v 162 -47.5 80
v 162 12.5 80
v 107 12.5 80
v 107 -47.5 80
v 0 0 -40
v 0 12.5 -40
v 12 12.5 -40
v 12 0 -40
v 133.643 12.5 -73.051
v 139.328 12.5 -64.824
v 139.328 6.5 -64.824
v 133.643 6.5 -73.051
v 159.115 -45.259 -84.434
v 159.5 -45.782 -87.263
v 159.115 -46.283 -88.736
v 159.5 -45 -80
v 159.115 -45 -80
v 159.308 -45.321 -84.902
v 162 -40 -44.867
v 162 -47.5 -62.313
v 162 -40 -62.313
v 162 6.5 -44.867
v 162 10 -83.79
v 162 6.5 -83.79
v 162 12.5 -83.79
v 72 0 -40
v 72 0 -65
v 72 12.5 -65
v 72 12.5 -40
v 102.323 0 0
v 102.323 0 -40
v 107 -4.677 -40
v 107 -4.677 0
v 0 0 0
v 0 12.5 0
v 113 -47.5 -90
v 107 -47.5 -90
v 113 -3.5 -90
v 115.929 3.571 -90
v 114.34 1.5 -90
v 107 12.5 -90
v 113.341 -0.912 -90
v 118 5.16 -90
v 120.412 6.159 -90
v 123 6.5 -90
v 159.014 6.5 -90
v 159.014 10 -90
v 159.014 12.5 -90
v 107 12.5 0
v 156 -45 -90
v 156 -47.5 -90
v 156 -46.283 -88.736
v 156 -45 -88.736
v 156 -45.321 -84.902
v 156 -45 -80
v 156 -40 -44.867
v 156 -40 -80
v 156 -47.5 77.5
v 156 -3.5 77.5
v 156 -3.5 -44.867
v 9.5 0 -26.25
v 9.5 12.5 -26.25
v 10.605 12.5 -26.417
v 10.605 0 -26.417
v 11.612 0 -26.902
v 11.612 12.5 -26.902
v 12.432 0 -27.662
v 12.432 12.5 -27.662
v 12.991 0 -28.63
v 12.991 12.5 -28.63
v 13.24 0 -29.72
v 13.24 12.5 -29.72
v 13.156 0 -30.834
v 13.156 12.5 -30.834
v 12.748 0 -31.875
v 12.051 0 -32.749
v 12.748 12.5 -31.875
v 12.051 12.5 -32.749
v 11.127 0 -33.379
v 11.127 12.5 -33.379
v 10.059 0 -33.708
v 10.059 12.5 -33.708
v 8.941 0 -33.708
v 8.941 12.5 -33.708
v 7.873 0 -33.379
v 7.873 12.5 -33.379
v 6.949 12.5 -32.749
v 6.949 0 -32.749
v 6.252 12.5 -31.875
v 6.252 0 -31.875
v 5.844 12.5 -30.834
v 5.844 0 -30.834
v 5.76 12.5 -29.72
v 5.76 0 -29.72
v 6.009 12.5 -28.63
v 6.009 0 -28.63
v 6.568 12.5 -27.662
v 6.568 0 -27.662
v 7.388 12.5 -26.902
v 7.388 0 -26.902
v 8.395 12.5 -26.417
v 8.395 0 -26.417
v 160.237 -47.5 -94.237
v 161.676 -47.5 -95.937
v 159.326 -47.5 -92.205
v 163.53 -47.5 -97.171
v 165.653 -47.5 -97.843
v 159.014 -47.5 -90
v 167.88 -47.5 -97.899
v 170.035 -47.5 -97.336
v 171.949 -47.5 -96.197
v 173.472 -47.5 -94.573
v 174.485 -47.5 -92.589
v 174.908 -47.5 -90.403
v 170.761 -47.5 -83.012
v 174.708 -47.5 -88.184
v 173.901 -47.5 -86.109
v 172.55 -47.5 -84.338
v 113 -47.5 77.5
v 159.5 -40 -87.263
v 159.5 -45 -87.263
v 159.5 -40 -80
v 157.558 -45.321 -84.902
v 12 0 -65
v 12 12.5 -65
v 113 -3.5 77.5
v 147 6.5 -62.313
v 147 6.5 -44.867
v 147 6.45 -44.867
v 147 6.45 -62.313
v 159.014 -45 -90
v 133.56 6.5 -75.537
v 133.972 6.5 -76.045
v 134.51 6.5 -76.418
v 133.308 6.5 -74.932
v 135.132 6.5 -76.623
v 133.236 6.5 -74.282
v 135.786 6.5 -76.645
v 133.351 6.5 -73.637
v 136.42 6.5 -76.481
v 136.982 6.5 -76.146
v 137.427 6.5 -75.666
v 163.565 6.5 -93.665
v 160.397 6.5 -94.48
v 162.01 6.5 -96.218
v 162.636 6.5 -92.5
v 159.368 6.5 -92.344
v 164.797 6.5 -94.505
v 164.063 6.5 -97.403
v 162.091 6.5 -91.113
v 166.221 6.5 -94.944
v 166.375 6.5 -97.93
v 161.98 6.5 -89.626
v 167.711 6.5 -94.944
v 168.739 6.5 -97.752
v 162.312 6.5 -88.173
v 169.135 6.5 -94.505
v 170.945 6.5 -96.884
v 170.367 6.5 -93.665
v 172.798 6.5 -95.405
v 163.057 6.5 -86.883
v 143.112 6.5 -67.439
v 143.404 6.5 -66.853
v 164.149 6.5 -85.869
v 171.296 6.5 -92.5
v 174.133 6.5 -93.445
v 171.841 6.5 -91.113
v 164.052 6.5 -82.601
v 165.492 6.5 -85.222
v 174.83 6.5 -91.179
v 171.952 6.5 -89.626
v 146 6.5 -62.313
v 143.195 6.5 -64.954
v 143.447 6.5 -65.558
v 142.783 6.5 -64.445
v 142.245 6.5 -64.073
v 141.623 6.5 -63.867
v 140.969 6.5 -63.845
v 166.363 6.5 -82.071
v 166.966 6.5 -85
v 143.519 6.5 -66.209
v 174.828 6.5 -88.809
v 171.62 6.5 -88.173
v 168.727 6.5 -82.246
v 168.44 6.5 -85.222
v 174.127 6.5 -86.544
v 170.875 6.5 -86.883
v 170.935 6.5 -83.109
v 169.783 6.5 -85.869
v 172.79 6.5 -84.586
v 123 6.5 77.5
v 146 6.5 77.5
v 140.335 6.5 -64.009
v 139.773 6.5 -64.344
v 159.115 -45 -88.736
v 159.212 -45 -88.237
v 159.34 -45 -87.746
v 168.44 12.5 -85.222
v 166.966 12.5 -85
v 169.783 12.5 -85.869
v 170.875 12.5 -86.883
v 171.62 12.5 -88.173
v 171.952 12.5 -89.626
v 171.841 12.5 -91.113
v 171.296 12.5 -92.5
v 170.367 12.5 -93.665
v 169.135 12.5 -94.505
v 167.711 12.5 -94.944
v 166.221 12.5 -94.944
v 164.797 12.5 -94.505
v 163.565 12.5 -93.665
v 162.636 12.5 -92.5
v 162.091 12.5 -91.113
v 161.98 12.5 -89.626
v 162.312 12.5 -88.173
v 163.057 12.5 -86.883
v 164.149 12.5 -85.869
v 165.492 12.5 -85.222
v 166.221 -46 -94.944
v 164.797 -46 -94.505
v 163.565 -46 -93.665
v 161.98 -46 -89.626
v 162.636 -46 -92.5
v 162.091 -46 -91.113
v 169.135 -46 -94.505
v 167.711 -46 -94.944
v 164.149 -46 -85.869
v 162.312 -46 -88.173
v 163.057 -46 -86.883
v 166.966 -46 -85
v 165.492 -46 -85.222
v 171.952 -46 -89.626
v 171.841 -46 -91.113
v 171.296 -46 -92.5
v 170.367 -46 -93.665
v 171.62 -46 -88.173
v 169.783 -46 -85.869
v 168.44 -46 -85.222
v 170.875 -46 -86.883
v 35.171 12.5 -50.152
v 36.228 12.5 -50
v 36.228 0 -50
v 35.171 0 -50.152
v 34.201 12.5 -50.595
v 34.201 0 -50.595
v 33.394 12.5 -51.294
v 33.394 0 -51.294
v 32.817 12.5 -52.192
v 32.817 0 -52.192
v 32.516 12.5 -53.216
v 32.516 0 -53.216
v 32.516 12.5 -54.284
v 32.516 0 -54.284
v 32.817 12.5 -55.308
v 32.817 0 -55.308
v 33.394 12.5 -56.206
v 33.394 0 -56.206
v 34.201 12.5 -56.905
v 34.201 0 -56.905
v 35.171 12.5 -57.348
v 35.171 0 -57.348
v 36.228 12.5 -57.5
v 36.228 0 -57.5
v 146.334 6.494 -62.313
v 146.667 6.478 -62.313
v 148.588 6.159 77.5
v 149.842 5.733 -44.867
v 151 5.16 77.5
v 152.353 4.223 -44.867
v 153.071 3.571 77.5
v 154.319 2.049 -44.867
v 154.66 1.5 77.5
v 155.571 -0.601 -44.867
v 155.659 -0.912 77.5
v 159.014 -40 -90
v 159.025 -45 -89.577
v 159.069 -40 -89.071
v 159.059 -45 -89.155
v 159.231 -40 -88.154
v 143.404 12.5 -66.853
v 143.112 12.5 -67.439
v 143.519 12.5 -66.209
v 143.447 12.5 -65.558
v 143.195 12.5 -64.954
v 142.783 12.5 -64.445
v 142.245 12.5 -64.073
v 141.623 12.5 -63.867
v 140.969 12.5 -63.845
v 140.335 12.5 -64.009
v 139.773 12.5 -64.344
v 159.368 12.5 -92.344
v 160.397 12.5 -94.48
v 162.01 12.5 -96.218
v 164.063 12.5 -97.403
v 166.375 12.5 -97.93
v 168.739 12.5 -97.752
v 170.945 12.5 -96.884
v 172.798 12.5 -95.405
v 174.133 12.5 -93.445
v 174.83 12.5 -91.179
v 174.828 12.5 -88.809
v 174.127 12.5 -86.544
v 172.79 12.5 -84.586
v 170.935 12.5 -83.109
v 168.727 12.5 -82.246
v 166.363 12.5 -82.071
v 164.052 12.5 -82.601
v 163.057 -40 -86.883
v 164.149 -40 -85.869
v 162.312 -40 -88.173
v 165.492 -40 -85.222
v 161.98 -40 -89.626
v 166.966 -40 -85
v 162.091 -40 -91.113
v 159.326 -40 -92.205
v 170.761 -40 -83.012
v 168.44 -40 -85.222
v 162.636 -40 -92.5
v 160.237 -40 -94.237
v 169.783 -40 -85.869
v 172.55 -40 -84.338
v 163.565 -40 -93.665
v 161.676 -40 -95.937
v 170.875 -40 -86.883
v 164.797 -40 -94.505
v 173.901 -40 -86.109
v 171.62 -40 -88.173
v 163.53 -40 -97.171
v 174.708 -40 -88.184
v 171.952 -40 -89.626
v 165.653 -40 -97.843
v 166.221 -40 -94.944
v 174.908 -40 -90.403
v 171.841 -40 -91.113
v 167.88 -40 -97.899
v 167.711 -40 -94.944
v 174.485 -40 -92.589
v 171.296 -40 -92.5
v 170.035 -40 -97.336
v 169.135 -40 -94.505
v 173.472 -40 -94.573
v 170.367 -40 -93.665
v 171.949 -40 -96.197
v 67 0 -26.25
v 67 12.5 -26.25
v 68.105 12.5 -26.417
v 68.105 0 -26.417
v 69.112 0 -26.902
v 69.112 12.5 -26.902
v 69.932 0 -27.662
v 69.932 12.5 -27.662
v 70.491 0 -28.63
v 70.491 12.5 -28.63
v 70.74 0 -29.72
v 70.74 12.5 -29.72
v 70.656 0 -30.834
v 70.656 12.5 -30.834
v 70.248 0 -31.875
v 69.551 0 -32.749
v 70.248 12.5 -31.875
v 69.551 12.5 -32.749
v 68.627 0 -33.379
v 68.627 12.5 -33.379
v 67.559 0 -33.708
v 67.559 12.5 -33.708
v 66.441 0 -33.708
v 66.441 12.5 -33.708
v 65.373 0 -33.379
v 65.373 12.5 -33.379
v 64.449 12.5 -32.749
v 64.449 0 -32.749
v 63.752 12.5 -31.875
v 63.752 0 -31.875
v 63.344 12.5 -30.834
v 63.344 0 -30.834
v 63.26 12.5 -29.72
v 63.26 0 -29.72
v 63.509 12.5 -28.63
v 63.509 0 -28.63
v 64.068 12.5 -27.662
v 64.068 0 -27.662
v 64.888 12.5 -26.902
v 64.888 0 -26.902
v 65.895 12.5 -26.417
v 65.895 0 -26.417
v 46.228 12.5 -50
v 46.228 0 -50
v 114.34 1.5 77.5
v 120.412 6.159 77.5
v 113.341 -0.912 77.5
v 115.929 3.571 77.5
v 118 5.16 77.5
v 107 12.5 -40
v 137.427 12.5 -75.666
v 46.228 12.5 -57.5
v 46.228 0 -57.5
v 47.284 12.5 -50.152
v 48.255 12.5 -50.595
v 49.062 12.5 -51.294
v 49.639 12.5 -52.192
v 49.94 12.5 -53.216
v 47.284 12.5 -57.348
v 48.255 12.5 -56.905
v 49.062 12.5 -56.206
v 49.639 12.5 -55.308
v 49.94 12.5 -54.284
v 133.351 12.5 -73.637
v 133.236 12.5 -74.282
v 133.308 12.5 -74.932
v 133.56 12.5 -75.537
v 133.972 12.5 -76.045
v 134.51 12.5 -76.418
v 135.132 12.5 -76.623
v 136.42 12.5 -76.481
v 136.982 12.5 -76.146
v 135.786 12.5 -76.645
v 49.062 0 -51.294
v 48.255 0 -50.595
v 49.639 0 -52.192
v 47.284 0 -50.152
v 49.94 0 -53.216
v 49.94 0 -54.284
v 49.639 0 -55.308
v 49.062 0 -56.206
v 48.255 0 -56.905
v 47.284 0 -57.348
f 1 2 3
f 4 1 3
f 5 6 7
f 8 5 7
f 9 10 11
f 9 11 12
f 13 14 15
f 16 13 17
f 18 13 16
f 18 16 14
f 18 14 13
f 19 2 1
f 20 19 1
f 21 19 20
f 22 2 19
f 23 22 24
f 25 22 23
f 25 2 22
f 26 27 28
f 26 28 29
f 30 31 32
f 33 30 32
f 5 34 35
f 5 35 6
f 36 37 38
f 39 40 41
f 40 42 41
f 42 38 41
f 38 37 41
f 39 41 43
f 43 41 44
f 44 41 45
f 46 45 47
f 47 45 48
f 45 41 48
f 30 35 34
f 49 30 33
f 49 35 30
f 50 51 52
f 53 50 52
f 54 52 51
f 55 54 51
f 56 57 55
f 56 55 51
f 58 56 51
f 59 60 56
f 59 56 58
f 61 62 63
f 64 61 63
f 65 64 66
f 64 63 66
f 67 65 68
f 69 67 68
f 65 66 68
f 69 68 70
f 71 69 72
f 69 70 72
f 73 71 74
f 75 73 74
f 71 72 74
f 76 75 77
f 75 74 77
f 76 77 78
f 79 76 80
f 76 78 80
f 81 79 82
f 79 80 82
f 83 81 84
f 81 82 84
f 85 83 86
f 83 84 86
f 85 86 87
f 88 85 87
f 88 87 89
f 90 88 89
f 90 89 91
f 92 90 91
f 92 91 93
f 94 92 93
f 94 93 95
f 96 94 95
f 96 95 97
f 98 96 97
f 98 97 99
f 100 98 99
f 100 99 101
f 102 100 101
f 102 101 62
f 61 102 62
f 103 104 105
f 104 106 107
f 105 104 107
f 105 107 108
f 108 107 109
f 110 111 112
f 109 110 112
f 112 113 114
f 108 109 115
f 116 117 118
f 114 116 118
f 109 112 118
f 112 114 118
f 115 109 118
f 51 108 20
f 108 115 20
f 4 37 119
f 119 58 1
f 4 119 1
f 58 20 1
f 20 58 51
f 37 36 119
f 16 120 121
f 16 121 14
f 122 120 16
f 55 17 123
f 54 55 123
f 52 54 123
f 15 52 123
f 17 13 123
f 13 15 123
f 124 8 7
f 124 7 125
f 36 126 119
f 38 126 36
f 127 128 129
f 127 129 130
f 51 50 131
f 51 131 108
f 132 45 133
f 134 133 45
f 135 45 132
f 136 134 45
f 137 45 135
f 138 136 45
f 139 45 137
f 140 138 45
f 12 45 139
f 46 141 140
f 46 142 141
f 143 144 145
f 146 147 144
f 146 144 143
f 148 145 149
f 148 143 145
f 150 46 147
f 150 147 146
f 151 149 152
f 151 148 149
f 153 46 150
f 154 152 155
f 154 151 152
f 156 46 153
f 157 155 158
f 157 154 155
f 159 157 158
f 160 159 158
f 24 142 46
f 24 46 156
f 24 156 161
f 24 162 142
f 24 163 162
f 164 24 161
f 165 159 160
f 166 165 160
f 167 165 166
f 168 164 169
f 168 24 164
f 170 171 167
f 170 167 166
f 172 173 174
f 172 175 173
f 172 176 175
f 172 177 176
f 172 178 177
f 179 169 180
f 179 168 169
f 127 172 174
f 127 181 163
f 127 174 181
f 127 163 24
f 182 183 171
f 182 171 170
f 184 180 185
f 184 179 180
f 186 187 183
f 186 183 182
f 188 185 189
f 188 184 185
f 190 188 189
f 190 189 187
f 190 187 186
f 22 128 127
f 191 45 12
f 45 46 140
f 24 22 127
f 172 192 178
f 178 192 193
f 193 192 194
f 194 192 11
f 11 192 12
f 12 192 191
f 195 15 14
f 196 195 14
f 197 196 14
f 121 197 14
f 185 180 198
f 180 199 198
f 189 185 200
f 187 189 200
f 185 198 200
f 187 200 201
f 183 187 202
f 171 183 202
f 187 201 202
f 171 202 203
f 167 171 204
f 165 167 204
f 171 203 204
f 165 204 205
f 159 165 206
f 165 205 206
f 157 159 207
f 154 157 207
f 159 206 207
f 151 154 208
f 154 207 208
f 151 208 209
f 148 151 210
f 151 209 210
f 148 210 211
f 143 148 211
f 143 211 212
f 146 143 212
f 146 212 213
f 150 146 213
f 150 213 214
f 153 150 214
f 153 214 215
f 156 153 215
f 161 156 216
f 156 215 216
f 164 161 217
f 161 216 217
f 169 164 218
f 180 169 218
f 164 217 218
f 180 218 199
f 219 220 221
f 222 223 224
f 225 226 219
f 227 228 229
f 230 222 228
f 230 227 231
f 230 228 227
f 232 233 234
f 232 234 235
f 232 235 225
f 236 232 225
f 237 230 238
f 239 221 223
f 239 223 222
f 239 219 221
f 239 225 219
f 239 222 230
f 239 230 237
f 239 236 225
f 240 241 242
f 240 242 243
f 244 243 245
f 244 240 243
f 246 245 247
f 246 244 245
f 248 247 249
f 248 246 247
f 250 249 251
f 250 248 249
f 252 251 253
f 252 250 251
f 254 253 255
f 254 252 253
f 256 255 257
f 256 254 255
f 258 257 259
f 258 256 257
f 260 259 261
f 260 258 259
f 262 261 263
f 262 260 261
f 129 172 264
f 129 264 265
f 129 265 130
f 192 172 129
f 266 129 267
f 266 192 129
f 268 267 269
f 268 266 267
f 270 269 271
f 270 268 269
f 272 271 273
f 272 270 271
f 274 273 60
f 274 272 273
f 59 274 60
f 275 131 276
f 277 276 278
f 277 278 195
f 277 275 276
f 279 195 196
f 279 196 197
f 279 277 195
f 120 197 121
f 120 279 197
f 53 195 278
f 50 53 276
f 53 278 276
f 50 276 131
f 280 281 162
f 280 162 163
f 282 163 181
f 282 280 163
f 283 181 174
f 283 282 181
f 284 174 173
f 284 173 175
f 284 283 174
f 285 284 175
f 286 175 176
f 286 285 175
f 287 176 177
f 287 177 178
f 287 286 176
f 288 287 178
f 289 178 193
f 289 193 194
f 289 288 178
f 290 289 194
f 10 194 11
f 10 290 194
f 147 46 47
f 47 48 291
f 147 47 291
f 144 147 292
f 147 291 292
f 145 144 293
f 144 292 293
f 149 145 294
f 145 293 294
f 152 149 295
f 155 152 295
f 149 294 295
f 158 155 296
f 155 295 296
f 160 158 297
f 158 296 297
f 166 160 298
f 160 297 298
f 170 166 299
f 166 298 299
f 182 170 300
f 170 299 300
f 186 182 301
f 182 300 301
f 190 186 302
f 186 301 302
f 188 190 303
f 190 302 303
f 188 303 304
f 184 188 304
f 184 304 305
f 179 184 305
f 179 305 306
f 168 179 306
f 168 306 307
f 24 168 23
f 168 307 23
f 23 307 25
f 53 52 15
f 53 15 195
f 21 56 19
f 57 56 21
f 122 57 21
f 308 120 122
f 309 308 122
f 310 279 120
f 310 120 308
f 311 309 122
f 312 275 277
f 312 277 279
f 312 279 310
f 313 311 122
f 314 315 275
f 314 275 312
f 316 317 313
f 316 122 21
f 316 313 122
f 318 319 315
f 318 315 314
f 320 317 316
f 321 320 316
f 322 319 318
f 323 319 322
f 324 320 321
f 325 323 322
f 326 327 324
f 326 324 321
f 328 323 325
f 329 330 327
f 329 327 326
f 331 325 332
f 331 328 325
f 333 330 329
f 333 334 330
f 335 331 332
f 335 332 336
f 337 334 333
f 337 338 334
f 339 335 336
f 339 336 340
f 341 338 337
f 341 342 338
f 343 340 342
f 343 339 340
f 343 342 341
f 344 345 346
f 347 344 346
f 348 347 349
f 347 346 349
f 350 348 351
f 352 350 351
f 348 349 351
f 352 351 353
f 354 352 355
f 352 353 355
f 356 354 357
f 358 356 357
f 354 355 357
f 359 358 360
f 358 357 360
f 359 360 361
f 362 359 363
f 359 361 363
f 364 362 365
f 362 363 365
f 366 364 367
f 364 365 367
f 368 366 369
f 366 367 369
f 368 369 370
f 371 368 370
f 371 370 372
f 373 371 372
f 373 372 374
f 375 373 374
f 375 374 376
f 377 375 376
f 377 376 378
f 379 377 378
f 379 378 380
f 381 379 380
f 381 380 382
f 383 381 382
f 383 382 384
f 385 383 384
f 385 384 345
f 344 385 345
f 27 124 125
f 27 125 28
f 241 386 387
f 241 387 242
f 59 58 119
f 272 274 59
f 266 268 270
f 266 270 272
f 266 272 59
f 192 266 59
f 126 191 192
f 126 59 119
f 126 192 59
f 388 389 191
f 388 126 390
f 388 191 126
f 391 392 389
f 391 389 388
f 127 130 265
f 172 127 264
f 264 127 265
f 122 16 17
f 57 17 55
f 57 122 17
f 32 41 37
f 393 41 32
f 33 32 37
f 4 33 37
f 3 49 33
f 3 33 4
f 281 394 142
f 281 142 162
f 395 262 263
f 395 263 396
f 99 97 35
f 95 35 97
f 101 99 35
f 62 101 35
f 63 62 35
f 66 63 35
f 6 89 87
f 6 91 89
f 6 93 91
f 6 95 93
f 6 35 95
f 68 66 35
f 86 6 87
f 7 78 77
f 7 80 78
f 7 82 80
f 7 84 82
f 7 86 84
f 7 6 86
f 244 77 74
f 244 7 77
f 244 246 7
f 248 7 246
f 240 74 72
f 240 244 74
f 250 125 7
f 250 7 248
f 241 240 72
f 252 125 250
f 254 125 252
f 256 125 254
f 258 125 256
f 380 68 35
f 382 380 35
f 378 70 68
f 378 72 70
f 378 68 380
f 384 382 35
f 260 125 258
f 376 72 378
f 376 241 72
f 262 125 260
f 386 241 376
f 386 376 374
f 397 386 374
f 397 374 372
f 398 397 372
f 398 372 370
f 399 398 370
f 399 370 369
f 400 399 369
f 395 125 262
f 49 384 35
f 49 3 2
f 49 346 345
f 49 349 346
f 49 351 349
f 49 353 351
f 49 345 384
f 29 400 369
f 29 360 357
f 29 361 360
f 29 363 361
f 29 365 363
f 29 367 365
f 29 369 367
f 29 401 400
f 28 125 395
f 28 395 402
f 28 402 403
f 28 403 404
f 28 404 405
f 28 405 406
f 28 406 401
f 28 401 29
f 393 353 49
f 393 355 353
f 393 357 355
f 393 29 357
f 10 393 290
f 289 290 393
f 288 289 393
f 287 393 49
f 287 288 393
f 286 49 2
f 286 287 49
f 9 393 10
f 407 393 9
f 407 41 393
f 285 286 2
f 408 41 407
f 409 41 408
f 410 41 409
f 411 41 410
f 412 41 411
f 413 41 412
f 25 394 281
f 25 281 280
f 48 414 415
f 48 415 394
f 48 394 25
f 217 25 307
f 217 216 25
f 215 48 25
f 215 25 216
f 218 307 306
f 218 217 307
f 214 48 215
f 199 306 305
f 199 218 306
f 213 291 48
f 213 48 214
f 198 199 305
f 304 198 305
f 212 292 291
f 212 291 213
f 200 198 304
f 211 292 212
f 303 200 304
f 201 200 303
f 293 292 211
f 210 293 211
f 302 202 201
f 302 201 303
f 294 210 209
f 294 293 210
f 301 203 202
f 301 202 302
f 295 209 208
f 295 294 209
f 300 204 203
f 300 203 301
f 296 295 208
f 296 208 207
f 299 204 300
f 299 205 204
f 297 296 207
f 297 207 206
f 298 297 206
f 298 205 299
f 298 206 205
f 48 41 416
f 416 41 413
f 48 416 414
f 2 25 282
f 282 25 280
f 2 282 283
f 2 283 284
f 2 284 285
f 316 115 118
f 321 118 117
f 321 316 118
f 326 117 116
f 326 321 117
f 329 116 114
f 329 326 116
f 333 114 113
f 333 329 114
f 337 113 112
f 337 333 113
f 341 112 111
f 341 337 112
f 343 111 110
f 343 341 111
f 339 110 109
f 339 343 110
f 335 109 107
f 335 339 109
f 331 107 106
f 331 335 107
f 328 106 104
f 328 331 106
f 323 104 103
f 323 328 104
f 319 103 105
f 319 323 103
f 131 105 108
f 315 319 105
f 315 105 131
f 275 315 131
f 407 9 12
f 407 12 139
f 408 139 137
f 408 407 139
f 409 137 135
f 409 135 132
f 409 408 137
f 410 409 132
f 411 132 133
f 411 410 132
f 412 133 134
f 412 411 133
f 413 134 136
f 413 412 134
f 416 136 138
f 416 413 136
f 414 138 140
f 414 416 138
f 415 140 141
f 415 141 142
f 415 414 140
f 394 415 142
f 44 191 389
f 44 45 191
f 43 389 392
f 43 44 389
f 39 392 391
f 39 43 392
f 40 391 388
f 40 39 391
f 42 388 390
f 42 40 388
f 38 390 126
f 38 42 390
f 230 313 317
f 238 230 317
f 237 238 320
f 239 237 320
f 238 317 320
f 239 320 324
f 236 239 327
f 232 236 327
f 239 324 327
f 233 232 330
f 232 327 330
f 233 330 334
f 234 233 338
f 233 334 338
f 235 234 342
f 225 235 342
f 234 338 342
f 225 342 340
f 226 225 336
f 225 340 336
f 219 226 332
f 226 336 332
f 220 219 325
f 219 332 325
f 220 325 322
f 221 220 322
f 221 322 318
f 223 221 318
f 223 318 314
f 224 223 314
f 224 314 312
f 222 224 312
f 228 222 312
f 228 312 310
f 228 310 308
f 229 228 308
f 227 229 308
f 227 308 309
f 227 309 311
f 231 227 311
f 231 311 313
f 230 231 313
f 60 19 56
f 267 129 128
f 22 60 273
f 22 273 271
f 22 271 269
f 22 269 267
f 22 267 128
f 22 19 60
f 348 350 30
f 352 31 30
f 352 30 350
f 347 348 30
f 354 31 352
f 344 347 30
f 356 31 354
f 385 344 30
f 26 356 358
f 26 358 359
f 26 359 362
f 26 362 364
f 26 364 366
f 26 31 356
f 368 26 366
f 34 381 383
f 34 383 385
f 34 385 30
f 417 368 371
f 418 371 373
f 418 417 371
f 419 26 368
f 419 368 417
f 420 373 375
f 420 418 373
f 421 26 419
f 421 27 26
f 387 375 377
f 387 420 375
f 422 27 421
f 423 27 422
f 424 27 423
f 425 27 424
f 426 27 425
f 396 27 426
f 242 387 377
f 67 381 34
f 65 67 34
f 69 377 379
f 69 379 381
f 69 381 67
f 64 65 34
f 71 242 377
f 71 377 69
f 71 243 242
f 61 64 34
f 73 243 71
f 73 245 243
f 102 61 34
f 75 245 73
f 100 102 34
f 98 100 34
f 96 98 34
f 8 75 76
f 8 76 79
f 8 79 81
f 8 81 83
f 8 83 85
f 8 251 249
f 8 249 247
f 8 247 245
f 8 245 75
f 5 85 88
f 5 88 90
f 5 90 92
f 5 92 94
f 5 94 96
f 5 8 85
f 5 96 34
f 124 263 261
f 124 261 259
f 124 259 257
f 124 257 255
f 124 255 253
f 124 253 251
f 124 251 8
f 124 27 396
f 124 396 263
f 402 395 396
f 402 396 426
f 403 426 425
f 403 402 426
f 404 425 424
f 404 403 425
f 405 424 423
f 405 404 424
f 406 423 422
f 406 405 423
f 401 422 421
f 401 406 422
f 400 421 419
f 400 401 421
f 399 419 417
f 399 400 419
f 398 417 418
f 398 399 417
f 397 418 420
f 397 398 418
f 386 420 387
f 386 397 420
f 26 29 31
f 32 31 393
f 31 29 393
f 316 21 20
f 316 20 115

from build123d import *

# Parameters (mm, degrees)
BOSS_EXTRUDE1_DEPTH  = 12.5
BOSS_EXTRUDE2_DEPTH  = 60
SKETCH3_W            = 50
SKETCH3_H            = 55
CUT_EXTRUDE1_DEPTH   = 167.5
FILLET1_SIZE         = 2.5
FILLET1_SIZE_2       = 10
BOSS_EXTRUDE3_REACH  = 196.792
SKETCH6_R            = 7.951814216
CUT_EXTRUDE2_DEPTH   = 55
SKETCH9_W            = 5.049792513
SKETCH9_H            = 55
CUT_EXTRUDE3_DEPTH   = 2.5
SKETCH10_R           = 5
CUT_EXTRUDE4_DEPTH   = 58.5
SKETCH11_W           = 20
SKETCH11_H           = 55
CUT_EXTRUDE6_DEPTH   = 2.5
SKETCH12_W           = 49.615365164
SKETCH12_H           = 4.469133196
CUT_EXTRUDE7_DEPTH   = 167.5
BOSS_EXTRUDE4_START  = 5
SKETCH13_R           = 5
BOSS_EXTRUDE4_DEPTH  = 5
BOSS_EXTRUDE5_DEPTH  = 2.5
SKETCH17_W           = 167.5
SKETCH17_H           = 57.5
BOSS_EXTRUDE6_DEPTH  = 3.5
BOSS_EXTRUDE7_DEPTH  = 3.5
SKETCH20_W           = 139.813438208
SKETCH20_H           = 51.5
BOSS_EXTRUDE8_DEPTH  = 3.5
BOSS_EXTRUDE9_DEPTH  = 3.115365164
BOSS_EXTRUDE10_START = 4
BOSS_EXTRUDE10_DEPTH = 4
SKETCH24_R           = 3.75
CUT_EXTRUDE8_DEPTH   = 210.262529948
CUT_EXTRUDE9_DEPTH   = 210.262529948
SKETCH26_R           = 5
CUT_EXTRUDE10_DEPTH  = 3.5
BOSS_EXTRUDE11_DEPTH = 40
FILLET2_R            = 10
CUT_EXTRUDE11_DEPTH  = 6
SKETCH30_W           = 17.446895317
SKETCH30_H           = 47.5
CUT_EXTRUDE12_DEPTH  = 15
BOSS_EXTRUDE12_START = 1
BOSS_EXTRUDE12_DEPTH = 1


with BuildPart() as part:
    # Sketch1 → Boss-Extrude1 (new body)
    with BuildSketch(Plane(origin=(0, 0, 0), x_dir=(1, 0, 0), z_dir=(0, 1, 0))):
        Polygon((0, 0), (0, 40), (12, 40), (12, 65), (72, 65), (72, 40), (107, 40), (107, 0), align=None)
    extrude(amount=BOSS_EXTRUDE1_DEPTH)

    # Sketch2 → Boss-Extrude2 (add)
    with BuildSketch(Plane(origin=(0, 12.5, 0), x_dir=(1, 0, 0), z_dir=(0, 1, 0))):
        Polygon((107, 0), (107, 40), (107, 90), (162, 90), (162, -80), (107, -80), align=None)
    extrude(amount=-BOSS_EXTRUDE2_DEPTH)

    # Sketch3 → Cut-Extrude1 (cut)
    with BuildSketch(Plane(origin=(0, 0, -90), x_dir=(-1, 0, 0), z_dir=(0, 0, -1))):
        with Locations((-134.5, -17.5)):
            Rectangle(SKETCH3_W, SKETCH3_H)
    extrude(amount=-CUT_EXTRUDE1_DEPTH, mode=Mode.SUBTRACT)

    # Fillet1
    # an asymmetric fillet: 10, 2.5 mm, written as the material it takes off along each edge
    with BuildSketch(Plane(origin=(159.5, -45, -90), x_dir=(0, -1, 0), z_dir=(-1, 0, 0))) as fillet1_piece_1:
        with BuildLine():
            Bezier((FILLET1_SIZE, 0), (0, 0), (0, FILLET1_SIZE_2), weights=[1, 0.707106781, 1])
            Line((0, FILLET1_SIZE_2), (0, 0))
            Line((0, 0), (FILLET1_SIZE, 0))
        make_face()
    extrude(amount=50, mode=Mode.SUBTRACT)

    # Boss-Extrude3: up to this face of the body (flat: up to its plane)
    boss_extrude3_end = Plane(part.part.faces().sort_by_distance((134.5, -47.5, -5))[0])
    # Sketch6 → Boss-Extrude3 (add, up to the picked face)
    with BuildSketch(Plane(origin=(0, 12.5, 0), x_dir=(1, 0, 0), z_dir=(0, 1, 0)), mode=Mode.PRIVATE) as boss_extrude3_sk1:
        with Locations((166.966019237, 90)):
            Circle(SKETCH6_R)
    boss_extrude3_tool1 = split(extrude(boss_extrude3_sk1.sketch, amount=-BOSS_EXTRUDE3_REACH, mode=Mode.PRIVATE), bisect_by=boss_extrude3_end, keep=Keep.BOTH, mode=Mode.PRIVATE)
    add(boss_extrude3_tool1.solids().sort_by(Axis((166.966019, 12.5, -90), (0, -1, 0)))[0])

    # Sketch7 → Cut-Extrude2 (cut)
    with BuildSketch(Plane(origin=(0, 10, 0), x_dir=(1, 0, 0), z_dir=(0, 1, 0))):
        with BuildLine():
            ThreePointArc((162, 83.789524795), (174.132615768, 93.445467092), (159.01420502, 90))
            ThreePointArc((159.01420502, 90), (159.799422705, 86.554532908), (162, 83.789524795))
        make_face()
    extrude(amount=-CUT_EXTRUDE2_DEPTH, mode=Mode.SUBTRACT)

    # Sketch9 → Cut-Extrude3 (cut)
    with BuildSketch(Plane(origin=(162, 0, 0), x_dir=(0, 0, -1), z_dir=(1, 0, 0))):
        with Locations((84.738334464, -17.5)):
            Rectangle(SKETCH9_W, SKETCH9_H)
    extrude(amount=-CUT_EXTRUDE3_DEPTH, mode=Mode.SUBTRACT)

    # Sketch10 → Cut-Extrude4 (cut)
    with BuildSketch(Plane(origin=(0, 12.5, 0), x_dir=(1, 0, 0), z_dir=(0, 1, 0))):
        with Locations(Location((166.966019237, 90, 0), (0, 0, 270))):
            Circle(SKETCH10_R)
    extrude(amount=-CUT_EXTRUDE4_DEPTH, mode=Mode.SUBTRACT)

    # Sketch11 → Cut-Extrude6 (cut)
    with BuildSketch(Plane(origin=(162, 0, 0), x_dir=(0, 0, -1), z_dir=(1, 0, 0))):
        with Locations((72.313438208, -17.5)):
            Rectangle(SKETCH11_W, SKETCH11_H)
    extrude(amount=-CUT_EXTRUDE6_DEPTH, mode=Mode.SUBTRACT)

    # Sketch12 → Cut-Extrude7 (cut)
    with BuildSketch(Plane(origin=(0, 0, -90), x_dir=(-1, 0, 0), z_dir=(0, 0, -1))):
        with Locations((-134.307682582, -47.234566598)):
            Rectangle(SKETCH12_W, SKETCH12_H)
    extrude(amount=-CUT_EXTRUDE7_DEPTH, mode=Mode.SUBTRACT)

    # Sketch13 → Boss-Extrude4 (add)
    with BuildSketch(Plane(origin=(0, -45, 0), x_dir=(1, 0, 0), z_dir=(0, 1, 0)).offset(BOSS_EXTRUDE4_START)):
        with BuildLine():
            ThreePointArc((162, 83.789524795), (174.132615768, 93.445467092), (159.01420502, 90))
            ThreePointArc((159.01420502, 90), (159.799422705, 86.554532908), (162, 83.789524795))
        make_face()
        with Locations(Location((166.966019237, 90, 0), (0, 0, 270))):
            Circle(SKETCH13_R, mode=Mode.SUBTRACT)
    extrude(amount=-BOSS_EXTRUDE4_DEPTH)

    # Sketch15 → Boss-Extrude5 (add)
    with BuildSketch(Plane(origin=(0, -45, 0), x_dir=(1, 0, 0), z_dir=(0, 1, 0))):
        with BuildLine():
            Line((162, 62.313438208), (162, 83.789524795))
            ThreePointArc((162, 83.789524795), (166.263013728, 82.079322467), (170.760595676, 83.011971739))
            Line((170.760595676, 83.011971739), (162, 62.313438208))
        make_face()
    extrude(amount=-BOSS_EXTRUDE5_DEPTH)

    # Sketch17 → Boss-Extrude6 (add)
    with BuildSketch(Plane(origin=(109.5, 0, 0), x_dir=(0, 0, -1), z_dir=(1, 0, 0))):
        with Locations((6.25, -18.75)):
            Rectangle(SKETCH17_W, SKETCH17_H)
    extrude(amount=BOSS_EXTRUDE6_DEPTH)

    # Sketch19 → Boss-Extrude7 (add)
    with BuildSketch(Plane.XZ.offset(-10)):
        with BuildLine():
            Line((159.5, 77.5), (113, 77.5))
            Line((113, 77.5), (113, -90))
            Line((113, -90), (159.01420502, -90))
            ThreePointArc((159.01420502, -90), (174.132615768, -93.445467092), (162, -83.789524795))
            Line((162, -83.789524795), (162, -62.313438208))
            Line((162, -62.313438208), (159.5, -62.313438208))
            Line((159.5, -62.313438208), (159.5, 77.5))
        make_face()
    extrude(amount=BOSS_EXTRUDE7_DEPTH)

    # Sketch20 → Boss-Extrude8 (add)
    with BuildSketch(Plane.ZY.offset(-159.5)):
        with Locations((7.593280896, -19.25)):
            Rectangle(SKETCH20_W, SKETCH20_H)
    extrude(amount=BOSS_EXTRUDE8_DEPTH)

    # Sketch21 → Boss-Extrude9 (add)
    with BuildSketch(Plane.ZY.offset(-159.115365164)):
        with BuildLine():
            Line((-90, -47.5), (77.5, -47.5))
            Line((77.5, -47.5), (77.5, -45))
            Line((77.5, -45), (-62.313438208, -45))
            Line((-62.313438208, -45), (-80, -45))
            add(Edge.make_bspline(
                [(-80, -45), (-85.875836894, -45), (-88.73565038, -46.28323142)],
                knots=[0.331688308, 0.331688308, 0.331688308, 1, 1, 1], degree=2, weights=[1, 0.804256037, 0.870148033]))
            Line((-88.73565038, -46.28323142), (-88.73565038, -45))
            Line((-88.73565038, -45), (-90, -45))
            Line((-90, -45), (-90, -47.5))
        make_face()
    extrude(amount=BOSS_EXTRUDE9_DEPTH)

    # Sketch22 → Boss-Extrude10 (add)
    with BuildSketch(Plane(origin=(0, -45, 0), x_dir=(1, 0, 0), z_dir=(0, 1, 0)).offset(BOSS_EXTRUDE10_START)):
        with BuildLine():
            Line((159.5, 80), (159.115365164, 80))
            Line((159.115365164, 80), (156, 80))
            Line((156, 80), (156, 62.313438208))
            Line((156, 62.313438208), (162, 62.313438208))
            Line((162, 62.313438208), (170.760595676, 83.011971739))
            ThreePointArc((170.760595676, 83.011971739), (164.157429949, 82.560700601), (159.5, 87.263230721))
            Line((159.5, 87.263230721), (159.5, 80))
        make_face()
    extrude(amount=-BOSS_EXTRUDE10_DEPTH)

    # Sketch24 → Cut-Extrude8 (cut, through all)
    with BuildSketch(Plane(origin=(0, 12.5, 0), x_dir=(1, 0, 0), z_dir=(0, 1, 0))):
        with Locations(Location((67, 30, 0), (0, 0, 270))):
            Circle(SKETCH24_R)
        with Locations(Location((9.5, 30, 0), (0, 0, 270))):
            Circle(SKETCH24_R)
    extrude(amount=-CUT_EXTRUDE8_DEPTH, mode=Mode.SUBTRACT)

    # Sketch25 → Cut-Extrude9 (cut, through all)
    with BuildSketch(Plane(origin=(0, 12.5, 0), x_dir=(1, 0, 0), z_dir=(0, 1, 0))):
        with BuildLine():
            Line((36.227939868, 57.5), (46.227939868, 57.5))
            ThreePointArc((46.227939868, 57.5), (49.977939868, 53.75), (46.227939868, 50))
            Line((46.227939868, 50), (36.227939868, 50))
            ThreePointArc((36.227939868, 50), (32.477939868, 53.75), (36.227939868, 57.5))
        make_face()
    extrude(amount=-CUT_EXTRUDE9_DEPTH, mode=Mode.SUBTRACT)

    # Sketch26 → Cut-Extrude10 (cut)
    with BuildSketch(Plane(origin=(0, 10, 0), x_dir=(1, 0, 0), z_dir=(0, 1, 0))):
        with Locations(Location((166.966019237, 90, 0), (0, 0, 270))):
            Circle(SKETCH26_R)
    extrude(amount=-CUT_EXTRUDE10_DEPTH, mode=Mode.SUBTRACT)

    # Sketch27 → Boss-Extrude11 (add)
    with BuildSketch(Plane(origin=(0, 0, -40), x_dir=(-1, 0, 0), z_dir=(0, 0, -1))):
        Polygon((-102.323268395, 0), (-107, -4.676731605), (-107, 0), align=None)
    extrude(amount=-BOSS_EXTRUDE11_DEPTH)

    # Fillet2
    fillet2_edges = [part.edges().sort_by_distance(p)[0] for p in [
        (113, 6.5, -6.25),
        (156, 6.5, 7.593280896),
    ]]
    fillet(fillet2_edges, radius=FILLET2_R)

    # Sketch28 → Cut-Extrude11 (cut)
    with BuildSketch(Plane(origin=(0, 12.5, 0), x_dir=(1, 0, 0), z_dir=(0, 1, 0))):
        with BuildLine():
            Line((137.427240594, 75.66601743), (143.112121915, 67.439102797))
            ThreePointArc((143.112121915, 67.439102797), (142.527454254, 64.239389728), (139.327741185, 64.82405739))
            Line((139.327741185, 64.82405739), (133.642859864, 73.050972022))
            ThreePointArc((133.642859864, 73.050972022), (134.227527525, 76.250685091), (137.427240594, 75.66601743))
        make_face()
    extrude(amount=-CUT_EXTRUDE11_DEPTH, mode=Mode.SUBTRACT)

    # Sketch30 → Cut-Extrude12 (cut)
    with BuildSketch(Plane(origin=(162, 0, 0), x_dir=(0, 0, -1), z_dir=(1, 0, 0))):
        with Locations((53.58999055, -17.25)):
            Rectangle(SKETCH30_W, SKETCH30_H)
    extrude(amount=-CUT_EXTRUDE12_DEPTH, mode=Mode.SUBTRACT)

    # Sketch31 → Boss-Extrude12 (add)
    with BuildSketch(Plane(origin=(0, -41, 0), x_dir=(1, 0, 0), z_dir=(0, 1, 0)).offset(BOSS_EXTRUDE12_START)):
        with BuildLine():
            Line((159.5, 87.263230721), (159.5, 80))
            Line((159.5, 80), (156, 80))
            Line((156, 80), (156, 44.866542891))
            Line((156, 44.866542891), (162, 44.866542891))
            Line((162, 44.866542891), (162, 62.313438208))
            Line((162, 62.313438208), (170.760595676, 83.011971739))
            ThreePointArc((170.760595676, 83.011971739), (164.157429949, 82.560700601), (159.5, 87.263230721))
        make_face()
    extrude(amount=-BOSS_EXTRUDE12_DEPTH)


solid = part.part
